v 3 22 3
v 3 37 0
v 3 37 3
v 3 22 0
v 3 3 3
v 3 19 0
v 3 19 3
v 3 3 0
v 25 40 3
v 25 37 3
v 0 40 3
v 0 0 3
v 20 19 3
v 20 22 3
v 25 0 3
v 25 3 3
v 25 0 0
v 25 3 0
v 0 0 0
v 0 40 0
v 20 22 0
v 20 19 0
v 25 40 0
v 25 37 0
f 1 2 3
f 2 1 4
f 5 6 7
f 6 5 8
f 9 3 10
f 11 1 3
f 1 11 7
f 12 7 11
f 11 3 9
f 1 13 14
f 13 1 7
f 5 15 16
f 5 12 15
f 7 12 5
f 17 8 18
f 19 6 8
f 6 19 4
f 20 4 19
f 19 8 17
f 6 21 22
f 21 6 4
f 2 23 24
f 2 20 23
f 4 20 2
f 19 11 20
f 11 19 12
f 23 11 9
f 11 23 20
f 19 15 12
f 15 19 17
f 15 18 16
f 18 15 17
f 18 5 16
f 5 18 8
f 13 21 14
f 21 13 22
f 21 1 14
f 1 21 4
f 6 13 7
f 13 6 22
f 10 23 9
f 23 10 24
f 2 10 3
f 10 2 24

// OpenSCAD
//model
x=3;
y=3;
z=3;

union(){ 
	cube([x,y+37,z]);
 	cube([x+22,y,z]);
 	translate([0,y+16,0]) cube([x+17,y,z]);
 	translate([0,y+34,0]) cube([x+22,y,z]);
}
